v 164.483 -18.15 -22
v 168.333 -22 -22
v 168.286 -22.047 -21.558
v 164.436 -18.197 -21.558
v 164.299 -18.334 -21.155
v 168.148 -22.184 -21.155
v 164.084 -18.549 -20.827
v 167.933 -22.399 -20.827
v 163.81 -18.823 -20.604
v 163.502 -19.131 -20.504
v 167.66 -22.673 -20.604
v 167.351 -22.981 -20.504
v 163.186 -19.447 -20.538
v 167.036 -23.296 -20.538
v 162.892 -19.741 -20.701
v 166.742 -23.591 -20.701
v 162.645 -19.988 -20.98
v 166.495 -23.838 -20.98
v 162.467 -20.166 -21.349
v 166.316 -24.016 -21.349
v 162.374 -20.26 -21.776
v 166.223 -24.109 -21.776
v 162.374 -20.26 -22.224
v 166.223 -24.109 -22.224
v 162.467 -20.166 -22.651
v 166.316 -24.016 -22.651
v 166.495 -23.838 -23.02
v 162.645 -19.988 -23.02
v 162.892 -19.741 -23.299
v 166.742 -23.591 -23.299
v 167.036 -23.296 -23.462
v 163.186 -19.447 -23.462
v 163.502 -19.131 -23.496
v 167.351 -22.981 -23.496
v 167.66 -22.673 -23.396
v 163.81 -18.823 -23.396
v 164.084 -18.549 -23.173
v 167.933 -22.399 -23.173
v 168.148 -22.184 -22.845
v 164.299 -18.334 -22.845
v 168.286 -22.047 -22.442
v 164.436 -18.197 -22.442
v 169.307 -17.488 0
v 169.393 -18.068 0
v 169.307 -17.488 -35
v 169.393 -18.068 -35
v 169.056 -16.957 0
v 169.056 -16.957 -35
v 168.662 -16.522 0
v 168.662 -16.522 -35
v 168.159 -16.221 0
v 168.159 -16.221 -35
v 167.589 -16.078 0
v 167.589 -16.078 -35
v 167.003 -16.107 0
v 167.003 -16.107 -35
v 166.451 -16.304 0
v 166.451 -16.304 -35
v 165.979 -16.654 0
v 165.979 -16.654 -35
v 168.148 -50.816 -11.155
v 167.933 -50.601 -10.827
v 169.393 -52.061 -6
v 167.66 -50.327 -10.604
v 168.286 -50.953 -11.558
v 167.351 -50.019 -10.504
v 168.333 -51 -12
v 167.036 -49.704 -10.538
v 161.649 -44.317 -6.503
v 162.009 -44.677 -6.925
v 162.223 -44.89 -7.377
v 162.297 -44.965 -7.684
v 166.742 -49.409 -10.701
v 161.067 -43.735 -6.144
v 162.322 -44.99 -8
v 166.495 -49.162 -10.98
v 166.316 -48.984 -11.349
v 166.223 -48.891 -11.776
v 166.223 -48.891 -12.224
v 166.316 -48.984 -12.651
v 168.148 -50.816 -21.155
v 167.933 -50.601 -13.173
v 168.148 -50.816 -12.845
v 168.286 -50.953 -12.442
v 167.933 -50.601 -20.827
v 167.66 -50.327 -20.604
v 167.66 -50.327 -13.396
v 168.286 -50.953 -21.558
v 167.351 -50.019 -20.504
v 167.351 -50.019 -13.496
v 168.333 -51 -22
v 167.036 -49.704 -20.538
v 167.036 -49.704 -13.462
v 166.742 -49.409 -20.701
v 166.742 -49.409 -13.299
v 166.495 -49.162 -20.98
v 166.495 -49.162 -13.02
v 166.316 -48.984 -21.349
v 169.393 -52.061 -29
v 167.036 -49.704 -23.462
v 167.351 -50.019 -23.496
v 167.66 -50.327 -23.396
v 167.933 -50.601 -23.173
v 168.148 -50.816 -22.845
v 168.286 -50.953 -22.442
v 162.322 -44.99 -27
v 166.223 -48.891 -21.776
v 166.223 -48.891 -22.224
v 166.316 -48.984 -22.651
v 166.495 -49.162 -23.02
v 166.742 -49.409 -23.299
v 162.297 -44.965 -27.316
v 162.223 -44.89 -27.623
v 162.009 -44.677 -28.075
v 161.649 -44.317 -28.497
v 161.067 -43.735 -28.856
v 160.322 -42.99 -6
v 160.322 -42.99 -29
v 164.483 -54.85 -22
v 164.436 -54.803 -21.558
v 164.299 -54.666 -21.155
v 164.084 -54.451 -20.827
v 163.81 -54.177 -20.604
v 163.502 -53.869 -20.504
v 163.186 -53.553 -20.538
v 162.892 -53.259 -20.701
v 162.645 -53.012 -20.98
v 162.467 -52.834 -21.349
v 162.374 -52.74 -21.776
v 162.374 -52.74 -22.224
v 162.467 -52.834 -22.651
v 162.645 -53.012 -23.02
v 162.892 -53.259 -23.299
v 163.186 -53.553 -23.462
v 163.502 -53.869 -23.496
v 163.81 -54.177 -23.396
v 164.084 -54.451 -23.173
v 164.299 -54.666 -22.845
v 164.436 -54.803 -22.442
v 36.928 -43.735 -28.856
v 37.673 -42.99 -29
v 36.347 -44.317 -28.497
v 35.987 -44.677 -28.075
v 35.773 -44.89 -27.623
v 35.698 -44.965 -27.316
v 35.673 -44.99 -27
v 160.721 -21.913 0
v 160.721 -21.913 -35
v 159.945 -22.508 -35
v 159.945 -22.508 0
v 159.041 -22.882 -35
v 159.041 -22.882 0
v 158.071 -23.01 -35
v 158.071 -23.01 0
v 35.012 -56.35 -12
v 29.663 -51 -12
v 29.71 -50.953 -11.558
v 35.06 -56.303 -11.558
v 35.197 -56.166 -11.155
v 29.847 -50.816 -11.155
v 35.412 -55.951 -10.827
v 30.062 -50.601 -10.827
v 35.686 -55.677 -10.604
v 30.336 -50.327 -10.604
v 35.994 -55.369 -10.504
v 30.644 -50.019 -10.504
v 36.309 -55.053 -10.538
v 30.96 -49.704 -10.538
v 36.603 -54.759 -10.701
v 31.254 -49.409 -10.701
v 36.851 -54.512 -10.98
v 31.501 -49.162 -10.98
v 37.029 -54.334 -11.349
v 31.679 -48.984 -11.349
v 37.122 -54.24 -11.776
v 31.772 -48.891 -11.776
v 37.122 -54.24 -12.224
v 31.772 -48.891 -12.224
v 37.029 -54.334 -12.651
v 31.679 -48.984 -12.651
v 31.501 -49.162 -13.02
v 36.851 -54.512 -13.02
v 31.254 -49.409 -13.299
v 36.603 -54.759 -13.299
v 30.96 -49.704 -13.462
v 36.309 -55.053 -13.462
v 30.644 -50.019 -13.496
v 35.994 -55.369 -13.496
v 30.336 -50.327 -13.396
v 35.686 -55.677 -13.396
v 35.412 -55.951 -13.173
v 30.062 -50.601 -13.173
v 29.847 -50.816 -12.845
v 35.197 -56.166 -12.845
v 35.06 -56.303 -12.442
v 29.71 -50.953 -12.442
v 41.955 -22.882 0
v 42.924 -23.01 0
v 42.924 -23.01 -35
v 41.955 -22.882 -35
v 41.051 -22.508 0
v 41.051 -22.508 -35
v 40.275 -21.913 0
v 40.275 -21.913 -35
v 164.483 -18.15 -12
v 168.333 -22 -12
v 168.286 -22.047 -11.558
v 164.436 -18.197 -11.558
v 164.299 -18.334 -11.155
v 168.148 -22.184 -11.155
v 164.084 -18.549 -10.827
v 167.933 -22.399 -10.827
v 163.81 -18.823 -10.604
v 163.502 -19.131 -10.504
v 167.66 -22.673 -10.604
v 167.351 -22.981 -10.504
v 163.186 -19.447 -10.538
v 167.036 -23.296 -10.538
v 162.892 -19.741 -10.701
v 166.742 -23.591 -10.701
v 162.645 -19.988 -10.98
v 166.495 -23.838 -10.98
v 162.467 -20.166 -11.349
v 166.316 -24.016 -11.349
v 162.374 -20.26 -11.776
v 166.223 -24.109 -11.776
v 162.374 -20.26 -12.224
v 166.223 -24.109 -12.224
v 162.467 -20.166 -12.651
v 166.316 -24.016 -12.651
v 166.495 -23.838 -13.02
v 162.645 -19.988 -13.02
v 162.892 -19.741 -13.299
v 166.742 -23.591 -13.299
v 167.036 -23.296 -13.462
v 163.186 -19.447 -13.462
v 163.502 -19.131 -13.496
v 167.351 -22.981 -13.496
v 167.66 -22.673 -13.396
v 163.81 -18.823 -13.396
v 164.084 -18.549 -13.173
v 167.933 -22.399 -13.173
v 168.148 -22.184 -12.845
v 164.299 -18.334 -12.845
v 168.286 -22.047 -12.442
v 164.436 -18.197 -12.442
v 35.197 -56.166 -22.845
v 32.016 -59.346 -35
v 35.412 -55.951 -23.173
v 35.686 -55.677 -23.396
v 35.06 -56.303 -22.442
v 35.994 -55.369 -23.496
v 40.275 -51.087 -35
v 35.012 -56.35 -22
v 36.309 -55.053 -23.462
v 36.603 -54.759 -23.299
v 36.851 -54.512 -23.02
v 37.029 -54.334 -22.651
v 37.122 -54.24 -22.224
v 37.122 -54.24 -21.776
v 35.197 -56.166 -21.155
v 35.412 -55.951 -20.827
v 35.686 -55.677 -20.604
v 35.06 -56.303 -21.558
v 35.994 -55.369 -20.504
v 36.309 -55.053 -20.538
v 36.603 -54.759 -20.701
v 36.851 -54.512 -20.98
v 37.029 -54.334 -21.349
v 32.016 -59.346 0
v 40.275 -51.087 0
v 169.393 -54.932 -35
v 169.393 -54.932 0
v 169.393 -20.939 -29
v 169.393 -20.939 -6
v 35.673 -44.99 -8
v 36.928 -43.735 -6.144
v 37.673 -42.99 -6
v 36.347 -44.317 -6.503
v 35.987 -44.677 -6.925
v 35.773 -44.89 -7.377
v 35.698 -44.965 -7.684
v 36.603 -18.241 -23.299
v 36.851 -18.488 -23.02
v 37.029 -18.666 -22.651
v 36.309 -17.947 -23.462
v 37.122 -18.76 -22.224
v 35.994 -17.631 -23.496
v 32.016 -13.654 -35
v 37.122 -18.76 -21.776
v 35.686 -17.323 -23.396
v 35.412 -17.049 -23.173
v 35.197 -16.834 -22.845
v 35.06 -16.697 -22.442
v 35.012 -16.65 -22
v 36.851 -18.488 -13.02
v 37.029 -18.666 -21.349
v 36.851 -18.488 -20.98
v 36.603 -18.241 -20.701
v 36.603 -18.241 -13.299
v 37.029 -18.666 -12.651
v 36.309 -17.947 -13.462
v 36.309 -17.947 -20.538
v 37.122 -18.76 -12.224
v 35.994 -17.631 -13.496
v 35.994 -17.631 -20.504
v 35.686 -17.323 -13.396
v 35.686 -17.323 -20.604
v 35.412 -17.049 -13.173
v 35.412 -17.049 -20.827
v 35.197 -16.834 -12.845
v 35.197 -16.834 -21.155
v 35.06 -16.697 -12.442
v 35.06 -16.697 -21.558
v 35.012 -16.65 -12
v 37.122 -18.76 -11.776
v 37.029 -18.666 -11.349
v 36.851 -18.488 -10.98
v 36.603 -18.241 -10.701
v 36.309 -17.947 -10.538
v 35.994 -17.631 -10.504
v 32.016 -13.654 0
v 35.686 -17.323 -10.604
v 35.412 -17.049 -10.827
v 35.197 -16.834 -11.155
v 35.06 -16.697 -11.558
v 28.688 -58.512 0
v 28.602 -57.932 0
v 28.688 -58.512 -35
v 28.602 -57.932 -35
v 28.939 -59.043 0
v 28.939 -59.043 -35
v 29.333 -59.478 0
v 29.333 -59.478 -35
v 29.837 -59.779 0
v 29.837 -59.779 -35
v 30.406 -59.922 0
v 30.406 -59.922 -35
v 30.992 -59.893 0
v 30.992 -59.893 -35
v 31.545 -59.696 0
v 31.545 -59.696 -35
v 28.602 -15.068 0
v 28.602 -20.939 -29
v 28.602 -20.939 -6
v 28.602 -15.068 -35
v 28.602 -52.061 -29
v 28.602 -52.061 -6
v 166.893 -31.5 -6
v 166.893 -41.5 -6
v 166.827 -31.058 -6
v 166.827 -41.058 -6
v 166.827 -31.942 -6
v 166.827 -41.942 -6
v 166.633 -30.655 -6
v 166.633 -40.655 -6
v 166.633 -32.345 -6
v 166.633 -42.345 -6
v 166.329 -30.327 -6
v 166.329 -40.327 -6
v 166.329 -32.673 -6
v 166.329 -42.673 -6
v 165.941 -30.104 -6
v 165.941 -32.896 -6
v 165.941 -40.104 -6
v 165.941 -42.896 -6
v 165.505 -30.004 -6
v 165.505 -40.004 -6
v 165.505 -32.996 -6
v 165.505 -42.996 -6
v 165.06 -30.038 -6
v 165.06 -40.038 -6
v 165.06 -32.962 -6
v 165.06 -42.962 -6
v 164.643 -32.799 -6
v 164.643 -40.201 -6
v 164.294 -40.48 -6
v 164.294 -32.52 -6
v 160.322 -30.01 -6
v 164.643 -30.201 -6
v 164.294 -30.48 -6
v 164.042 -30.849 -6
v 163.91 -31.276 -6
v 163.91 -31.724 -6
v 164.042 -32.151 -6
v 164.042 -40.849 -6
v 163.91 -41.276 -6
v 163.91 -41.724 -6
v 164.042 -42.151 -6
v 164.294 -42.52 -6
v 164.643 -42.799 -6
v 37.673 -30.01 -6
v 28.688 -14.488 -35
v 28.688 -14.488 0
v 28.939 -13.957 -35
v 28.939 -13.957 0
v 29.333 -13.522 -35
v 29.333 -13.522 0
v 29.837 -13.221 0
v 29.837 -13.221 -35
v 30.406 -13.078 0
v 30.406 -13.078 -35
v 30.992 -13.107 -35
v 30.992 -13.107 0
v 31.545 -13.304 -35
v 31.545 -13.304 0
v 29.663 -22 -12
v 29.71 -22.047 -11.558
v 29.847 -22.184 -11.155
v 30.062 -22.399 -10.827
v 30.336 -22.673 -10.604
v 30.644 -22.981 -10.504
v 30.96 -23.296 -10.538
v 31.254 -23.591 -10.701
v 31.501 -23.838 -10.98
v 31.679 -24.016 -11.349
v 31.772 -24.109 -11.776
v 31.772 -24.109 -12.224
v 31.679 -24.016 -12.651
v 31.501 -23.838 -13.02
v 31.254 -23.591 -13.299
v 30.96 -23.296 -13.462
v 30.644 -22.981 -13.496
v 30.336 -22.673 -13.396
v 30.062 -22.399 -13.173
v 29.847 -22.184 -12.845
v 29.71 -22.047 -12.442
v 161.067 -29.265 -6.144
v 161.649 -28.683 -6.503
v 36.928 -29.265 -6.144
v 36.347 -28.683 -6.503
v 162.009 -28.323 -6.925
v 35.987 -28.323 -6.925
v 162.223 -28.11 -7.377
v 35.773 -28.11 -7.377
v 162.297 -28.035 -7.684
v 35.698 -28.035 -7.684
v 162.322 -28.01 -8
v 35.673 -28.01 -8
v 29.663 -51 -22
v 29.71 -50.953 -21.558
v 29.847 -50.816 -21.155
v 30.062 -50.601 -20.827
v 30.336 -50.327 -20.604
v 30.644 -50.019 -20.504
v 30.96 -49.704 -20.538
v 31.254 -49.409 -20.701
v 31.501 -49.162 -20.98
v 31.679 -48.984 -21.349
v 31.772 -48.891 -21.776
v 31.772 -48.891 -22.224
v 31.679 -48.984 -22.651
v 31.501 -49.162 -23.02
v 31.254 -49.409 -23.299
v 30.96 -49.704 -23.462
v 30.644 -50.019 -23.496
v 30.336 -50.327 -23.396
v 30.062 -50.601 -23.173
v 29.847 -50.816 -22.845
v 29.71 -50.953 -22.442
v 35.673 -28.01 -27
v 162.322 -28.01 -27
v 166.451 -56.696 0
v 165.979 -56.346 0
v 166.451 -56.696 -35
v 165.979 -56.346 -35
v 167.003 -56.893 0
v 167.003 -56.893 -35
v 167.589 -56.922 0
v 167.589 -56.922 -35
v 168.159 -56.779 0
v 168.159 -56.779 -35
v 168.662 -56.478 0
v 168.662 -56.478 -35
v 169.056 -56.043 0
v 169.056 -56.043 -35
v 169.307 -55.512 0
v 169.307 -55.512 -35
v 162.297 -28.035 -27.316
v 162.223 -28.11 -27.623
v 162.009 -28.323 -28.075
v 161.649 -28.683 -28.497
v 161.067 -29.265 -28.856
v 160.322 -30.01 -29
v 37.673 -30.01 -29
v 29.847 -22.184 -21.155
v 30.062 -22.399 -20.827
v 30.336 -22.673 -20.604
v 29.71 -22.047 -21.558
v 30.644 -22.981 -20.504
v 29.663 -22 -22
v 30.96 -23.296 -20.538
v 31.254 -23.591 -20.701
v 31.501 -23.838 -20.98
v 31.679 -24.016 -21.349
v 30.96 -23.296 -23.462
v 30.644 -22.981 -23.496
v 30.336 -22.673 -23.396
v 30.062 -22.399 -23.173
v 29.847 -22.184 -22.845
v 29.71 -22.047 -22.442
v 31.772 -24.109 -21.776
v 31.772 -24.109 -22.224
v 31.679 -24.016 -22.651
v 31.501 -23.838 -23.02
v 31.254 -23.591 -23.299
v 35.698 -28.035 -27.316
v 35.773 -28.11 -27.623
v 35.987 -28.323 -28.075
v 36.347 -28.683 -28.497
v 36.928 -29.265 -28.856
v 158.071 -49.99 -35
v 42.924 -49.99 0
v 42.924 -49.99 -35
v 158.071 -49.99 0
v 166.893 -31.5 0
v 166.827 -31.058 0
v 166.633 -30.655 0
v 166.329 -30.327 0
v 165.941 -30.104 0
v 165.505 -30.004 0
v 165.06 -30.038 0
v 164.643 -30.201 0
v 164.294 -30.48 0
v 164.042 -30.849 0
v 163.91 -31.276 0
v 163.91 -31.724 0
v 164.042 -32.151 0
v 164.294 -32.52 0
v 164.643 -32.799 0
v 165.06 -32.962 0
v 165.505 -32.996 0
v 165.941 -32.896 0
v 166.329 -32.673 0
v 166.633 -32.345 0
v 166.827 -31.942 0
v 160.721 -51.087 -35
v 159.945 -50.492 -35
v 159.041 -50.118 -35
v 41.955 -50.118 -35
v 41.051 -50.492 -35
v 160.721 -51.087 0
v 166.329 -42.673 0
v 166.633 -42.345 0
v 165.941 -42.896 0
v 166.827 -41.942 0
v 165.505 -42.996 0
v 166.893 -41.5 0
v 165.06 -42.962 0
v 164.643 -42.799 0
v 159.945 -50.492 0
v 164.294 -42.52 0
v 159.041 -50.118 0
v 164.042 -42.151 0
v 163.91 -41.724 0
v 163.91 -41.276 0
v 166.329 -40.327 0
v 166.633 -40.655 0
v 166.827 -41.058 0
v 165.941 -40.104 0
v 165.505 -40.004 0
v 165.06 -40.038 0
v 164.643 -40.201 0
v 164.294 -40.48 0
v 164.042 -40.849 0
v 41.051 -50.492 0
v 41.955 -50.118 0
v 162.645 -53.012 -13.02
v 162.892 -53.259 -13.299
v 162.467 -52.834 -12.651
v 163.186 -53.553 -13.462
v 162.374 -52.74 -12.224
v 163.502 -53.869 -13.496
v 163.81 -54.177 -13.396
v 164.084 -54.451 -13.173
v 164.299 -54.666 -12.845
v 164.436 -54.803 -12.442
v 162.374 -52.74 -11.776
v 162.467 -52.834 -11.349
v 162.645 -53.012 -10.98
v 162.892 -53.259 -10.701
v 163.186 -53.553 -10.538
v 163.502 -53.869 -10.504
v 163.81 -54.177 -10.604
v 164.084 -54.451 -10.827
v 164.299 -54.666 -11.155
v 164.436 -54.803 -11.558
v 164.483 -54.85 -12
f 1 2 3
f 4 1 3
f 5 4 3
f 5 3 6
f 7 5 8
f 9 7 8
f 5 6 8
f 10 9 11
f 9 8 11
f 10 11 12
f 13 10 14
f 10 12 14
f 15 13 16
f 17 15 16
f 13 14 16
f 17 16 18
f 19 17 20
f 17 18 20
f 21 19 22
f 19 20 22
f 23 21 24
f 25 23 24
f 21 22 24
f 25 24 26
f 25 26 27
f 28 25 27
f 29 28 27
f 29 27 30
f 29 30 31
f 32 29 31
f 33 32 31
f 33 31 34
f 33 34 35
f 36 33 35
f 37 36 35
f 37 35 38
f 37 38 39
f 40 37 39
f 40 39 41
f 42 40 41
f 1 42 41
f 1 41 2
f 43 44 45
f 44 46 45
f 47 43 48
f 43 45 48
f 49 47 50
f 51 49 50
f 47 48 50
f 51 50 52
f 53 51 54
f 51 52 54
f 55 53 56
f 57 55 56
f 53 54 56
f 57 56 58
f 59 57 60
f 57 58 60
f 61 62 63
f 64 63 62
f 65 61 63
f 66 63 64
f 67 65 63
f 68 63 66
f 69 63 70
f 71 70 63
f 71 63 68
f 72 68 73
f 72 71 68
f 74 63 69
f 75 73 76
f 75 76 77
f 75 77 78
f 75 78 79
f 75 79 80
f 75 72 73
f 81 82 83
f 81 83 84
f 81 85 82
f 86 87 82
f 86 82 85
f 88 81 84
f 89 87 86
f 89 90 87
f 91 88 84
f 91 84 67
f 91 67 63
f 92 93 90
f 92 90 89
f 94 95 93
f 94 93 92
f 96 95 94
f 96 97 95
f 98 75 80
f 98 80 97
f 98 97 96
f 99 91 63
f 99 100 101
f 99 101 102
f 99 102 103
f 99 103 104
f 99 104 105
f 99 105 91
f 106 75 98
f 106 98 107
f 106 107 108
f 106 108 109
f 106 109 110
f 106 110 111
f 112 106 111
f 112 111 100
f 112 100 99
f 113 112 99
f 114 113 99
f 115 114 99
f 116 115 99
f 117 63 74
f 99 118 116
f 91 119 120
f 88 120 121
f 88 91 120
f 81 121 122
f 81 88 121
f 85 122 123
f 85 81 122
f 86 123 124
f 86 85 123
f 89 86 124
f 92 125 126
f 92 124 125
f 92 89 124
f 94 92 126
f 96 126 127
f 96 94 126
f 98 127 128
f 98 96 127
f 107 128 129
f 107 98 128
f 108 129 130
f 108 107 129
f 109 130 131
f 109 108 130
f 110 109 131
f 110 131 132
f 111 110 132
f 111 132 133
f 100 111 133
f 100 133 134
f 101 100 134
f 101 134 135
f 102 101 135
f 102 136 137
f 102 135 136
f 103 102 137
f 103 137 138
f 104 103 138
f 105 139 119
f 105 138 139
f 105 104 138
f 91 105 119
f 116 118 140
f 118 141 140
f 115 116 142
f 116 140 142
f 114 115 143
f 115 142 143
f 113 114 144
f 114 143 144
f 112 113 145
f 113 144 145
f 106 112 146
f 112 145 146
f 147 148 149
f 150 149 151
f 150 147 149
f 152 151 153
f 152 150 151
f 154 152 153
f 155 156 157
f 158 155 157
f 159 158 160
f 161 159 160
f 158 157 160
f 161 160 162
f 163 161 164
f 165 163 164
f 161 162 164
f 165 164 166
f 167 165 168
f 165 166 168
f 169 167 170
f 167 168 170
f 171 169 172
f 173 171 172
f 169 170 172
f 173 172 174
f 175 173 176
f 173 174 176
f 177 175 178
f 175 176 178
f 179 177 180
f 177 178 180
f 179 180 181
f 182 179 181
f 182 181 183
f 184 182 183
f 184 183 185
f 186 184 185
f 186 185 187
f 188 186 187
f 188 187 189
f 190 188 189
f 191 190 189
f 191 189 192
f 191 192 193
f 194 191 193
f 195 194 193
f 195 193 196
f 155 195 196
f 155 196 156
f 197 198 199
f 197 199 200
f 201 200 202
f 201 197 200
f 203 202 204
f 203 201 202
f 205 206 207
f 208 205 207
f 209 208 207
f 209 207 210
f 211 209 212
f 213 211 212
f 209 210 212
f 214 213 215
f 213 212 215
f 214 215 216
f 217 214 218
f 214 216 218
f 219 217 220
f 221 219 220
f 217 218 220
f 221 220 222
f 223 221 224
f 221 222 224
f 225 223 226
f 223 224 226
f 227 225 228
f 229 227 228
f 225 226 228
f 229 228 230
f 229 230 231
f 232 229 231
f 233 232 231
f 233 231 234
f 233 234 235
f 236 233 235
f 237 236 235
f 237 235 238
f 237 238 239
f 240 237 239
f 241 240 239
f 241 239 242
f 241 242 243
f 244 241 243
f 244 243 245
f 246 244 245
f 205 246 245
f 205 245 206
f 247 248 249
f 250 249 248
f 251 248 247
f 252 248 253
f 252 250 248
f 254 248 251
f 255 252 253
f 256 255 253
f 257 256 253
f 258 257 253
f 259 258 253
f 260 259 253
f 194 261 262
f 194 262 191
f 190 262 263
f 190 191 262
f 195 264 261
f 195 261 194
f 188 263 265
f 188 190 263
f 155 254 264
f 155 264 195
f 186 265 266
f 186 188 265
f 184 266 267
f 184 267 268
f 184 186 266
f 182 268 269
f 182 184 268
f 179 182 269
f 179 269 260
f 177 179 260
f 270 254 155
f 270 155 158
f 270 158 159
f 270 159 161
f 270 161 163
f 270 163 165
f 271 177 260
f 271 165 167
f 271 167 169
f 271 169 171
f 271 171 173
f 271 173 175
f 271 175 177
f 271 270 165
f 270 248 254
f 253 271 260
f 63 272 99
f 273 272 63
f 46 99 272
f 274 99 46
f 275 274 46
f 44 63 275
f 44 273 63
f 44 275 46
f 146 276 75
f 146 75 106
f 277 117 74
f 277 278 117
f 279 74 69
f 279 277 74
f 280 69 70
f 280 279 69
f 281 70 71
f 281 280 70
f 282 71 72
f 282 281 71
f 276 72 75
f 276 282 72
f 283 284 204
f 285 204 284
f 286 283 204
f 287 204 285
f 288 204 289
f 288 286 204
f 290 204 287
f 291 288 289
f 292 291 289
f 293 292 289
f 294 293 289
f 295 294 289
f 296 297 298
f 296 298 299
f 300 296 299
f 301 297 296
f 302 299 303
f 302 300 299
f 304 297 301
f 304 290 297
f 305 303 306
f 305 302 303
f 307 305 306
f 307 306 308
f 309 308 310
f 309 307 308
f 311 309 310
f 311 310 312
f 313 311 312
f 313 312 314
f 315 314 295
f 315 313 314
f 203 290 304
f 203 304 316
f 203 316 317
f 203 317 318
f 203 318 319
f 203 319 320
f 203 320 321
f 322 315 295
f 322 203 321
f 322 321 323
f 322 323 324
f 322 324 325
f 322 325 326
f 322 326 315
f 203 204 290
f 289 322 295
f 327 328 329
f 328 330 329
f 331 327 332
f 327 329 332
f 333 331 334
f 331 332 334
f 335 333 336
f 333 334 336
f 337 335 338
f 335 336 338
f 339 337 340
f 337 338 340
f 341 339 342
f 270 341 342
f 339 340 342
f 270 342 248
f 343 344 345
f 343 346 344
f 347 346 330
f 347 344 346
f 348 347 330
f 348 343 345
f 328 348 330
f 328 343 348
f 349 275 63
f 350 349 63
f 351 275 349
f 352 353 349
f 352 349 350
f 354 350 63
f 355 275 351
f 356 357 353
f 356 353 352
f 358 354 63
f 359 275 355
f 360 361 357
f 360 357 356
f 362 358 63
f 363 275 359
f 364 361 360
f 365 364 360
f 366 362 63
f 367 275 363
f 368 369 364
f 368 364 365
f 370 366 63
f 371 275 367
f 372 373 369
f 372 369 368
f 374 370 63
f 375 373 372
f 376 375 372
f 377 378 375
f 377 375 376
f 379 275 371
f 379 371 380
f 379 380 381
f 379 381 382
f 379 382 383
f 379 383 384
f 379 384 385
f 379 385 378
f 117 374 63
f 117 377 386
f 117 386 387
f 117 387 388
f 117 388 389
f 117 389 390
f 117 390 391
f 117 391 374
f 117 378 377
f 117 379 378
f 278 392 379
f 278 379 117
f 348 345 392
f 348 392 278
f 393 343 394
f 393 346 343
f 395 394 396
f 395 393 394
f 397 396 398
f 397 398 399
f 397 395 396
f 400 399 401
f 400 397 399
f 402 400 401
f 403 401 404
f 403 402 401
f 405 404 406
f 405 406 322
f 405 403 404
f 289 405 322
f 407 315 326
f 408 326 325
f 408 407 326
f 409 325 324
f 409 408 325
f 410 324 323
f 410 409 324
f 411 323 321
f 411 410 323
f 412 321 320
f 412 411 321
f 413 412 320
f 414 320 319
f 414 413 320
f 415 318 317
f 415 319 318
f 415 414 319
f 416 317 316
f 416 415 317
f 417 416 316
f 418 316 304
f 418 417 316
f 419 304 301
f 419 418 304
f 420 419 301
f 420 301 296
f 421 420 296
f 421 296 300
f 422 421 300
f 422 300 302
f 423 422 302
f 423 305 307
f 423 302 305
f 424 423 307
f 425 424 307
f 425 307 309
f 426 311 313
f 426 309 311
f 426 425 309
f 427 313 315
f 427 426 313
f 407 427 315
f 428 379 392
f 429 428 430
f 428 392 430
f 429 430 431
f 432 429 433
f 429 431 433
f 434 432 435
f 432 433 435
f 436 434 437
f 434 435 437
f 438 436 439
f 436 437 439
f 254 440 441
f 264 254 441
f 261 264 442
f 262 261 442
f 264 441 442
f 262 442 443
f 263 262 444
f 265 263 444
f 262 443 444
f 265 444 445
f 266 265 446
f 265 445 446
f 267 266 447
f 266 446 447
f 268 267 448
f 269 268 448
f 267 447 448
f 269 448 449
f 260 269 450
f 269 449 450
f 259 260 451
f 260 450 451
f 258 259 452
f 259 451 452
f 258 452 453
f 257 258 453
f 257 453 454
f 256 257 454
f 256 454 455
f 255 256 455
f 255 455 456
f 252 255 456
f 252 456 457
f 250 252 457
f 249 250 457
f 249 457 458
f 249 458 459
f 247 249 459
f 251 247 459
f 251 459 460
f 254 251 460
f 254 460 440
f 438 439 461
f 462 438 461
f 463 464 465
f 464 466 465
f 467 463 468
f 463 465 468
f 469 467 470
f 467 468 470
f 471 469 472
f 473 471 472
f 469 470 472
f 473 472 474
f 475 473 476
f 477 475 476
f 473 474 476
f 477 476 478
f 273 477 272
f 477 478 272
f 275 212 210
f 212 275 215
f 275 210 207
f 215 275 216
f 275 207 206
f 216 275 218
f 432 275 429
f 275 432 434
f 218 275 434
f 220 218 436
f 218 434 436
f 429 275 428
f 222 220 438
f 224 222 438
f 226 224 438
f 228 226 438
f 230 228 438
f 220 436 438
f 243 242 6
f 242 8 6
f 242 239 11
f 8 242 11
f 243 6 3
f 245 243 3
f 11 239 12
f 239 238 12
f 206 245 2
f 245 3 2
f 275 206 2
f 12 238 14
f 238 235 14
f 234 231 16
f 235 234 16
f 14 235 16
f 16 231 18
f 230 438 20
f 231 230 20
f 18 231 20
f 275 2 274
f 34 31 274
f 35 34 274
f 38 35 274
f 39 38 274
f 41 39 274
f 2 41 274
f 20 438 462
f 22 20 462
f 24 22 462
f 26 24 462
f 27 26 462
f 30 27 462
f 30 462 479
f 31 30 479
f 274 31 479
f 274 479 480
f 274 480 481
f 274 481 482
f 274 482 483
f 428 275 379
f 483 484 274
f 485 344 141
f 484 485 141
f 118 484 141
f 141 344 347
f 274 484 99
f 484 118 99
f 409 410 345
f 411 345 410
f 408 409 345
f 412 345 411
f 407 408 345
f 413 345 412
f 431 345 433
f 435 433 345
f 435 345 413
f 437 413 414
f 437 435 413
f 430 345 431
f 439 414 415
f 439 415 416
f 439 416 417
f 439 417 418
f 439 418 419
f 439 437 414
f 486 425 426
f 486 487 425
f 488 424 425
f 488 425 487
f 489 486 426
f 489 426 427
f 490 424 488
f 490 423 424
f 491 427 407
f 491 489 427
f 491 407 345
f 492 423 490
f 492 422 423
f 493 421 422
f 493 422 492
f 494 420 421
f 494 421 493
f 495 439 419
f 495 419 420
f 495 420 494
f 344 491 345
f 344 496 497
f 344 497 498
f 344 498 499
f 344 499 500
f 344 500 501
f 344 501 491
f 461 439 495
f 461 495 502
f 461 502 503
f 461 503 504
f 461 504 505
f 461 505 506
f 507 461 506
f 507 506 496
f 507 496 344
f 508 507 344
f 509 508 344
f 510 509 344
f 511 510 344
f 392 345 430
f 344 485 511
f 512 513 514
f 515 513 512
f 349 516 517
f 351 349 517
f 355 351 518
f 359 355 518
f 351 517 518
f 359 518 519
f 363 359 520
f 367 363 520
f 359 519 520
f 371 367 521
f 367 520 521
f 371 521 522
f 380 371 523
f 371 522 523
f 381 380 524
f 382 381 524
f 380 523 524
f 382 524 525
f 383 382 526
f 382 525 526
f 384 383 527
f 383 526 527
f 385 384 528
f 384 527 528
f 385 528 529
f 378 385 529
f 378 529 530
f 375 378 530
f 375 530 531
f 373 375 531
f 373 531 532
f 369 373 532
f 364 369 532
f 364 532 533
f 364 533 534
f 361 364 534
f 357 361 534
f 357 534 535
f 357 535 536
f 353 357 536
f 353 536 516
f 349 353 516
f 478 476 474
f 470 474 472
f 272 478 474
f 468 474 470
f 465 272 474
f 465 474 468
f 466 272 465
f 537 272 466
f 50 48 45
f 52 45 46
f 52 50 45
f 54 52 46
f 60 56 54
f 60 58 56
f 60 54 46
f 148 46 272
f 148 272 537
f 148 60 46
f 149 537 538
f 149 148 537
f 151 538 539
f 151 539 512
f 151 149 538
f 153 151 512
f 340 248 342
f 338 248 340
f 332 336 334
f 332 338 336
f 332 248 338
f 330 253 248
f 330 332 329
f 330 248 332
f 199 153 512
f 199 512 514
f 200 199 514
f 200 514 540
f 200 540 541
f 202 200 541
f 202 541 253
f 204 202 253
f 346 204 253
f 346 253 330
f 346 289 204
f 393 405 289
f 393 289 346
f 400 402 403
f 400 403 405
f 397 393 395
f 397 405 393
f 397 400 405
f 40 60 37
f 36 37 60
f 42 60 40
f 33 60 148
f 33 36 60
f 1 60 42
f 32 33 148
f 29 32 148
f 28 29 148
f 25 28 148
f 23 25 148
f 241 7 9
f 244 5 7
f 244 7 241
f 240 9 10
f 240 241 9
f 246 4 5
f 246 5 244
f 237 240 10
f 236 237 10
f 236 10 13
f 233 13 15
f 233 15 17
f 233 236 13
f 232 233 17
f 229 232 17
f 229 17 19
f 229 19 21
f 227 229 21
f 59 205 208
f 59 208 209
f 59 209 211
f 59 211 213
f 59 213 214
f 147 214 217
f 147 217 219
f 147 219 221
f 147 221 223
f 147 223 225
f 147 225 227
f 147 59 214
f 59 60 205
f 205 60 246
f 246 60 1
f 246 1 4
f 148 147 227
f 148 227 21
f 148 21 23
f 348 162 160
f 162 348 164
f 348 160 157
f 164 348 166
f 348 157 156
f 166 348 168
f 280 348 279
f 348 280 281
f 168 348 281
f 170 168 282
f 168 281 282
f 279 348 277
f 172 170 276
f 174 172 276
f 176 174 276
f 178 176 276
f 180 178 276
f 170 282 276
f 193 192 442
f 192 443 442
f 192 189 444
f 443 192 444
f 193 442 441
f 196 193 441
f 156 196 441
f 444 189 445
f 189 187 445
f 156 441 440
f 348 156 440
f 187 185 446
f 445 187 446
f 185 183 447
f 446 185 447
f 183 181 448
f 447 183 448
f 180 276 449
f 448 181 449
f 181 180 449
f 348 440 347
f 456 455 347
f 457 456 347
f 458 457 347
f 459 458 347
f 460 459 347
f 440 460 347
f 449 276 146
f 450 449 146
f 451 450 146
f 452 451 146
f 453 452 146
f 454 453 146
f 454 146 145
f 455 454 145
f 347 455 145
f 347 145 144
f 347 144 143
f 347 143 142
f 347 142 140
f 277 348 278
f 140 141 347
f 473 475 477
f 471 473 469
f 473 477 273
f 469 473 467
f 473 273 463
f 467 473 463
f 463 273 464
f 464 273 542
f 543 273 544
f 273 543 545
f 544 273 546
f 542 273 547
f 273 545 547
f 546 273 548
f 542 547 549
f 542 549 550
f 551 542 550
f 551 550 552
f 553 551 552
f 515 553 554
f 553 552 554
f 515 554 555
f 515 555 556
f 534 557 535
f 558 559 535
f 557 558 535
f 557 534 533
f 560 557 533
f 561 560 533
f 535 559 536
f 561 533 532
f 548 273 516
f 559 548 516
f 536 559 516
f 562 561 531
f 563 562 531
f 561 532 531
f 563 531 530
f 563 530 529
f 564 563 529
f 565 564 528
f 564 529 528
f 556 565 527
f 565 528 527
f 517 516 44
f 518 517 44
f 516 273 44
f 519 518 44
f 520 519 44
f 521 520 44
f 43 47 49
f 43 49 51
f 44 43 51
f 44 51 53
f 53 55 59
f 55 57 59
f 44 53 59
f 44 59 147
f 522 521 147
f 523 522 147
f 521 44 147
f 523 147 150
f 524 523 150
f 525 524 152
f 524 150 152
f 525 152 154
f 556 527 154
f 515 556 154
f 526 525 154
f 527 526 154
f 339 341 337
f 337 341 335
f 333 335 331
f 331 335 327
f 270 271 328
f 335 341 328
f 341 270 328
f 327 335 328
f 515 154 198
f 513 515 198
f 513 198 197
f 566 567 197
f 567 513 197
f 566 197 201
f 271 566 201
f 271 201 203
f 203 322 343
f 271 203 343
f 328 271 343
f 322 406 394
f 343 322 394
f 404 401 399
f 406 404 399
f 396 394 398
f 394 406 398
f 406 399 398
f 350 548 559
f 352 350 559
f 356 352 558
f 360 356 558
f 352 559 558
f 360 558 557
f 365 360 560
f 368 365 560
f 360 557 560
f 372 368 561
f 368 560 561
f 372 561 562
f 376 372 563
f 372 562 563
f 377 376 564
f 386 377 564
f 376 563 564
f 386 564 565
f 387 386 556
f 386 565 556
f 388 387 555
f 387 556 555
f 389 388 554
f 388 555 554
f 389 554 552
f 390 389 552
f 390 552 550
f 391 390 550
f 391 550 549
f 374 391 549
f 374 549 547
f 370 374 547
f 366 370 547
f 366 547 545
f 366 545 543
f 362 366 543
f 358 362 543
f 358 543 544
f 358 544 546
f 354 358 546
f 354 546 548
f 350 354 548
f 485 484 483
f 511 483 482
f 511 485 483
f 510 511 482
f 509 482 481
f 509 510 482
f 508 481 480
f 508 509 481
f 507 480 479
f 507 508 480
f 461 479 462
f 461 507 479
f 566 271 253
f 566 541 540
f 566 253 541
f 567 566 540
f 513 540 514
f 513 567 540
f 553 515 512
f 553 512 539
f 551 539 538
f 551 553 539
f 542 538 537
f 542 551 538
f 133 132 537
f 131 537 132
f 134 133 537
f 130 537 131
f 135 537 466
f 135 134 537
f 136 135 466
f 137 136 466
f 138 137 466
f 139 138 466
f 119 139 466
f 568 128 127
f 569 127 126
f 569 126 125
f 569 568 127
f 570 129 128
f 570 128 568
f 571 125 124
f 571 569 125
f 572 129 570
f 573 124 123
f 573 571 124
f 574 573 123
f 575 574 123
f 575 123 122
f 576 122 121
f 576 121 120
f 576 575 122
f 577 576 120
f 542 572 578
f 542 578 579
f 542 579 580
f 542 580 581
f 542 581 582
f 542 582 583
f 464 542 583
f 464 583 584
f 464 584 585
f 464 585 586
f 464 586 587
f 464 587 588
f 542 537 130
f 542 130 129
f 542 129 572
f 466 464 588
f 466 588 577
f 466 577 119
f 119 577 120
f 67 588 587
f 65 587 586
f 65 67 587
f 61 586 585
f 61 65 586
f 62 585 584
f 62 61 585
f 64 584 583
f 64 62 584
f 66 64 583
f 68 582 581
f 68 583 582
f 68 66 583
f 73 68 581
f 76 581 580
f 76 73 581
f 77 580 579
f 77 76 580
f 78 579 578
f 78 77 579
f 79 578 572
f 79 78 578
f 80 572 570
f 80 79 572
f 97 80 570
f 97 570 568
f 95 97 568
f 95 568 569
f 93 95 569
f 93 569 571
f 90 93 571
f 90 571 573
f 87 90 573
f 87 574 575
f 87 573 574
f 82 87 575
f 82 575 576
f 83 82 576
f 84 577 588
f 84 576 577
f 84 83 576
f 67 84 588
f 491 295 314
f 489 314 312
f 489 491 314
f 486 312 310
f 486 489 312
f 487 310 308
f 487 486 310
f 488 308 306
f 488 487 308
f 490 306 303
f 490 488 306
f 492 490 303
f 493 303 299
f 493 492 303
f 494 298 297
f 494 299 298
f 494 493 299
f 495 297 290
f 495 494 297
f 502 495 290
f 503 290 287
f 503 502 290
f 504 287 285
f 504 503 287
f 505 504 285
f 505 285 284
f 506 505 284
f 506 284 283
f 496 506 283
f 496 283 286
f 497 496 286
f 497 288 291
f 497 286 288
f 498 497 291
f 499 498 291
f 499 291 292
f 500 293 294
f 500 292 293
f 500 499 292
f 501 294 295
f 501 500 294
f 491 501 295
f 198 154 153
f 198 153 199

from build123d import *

# Parameters (mm, degrees)
EXTRUDE_1_DEPTH          = 35
CUT_EXTRUDE_1_DEPTH      = 185.022712326
SKETCH_3_W               = 23
SKETCH_3_H               = 16.98
CUT_EXTRUDE_2_DEPTH      = 159.069540958
SKETCH_5_W               = 23
SKETCH_5_H               = 7.5
CUT_EXTRUDE_3_DEPTH      = 5
SKETCH_6_R               = 1.5
CUT_EXTRUDE_4_DEPTH      = 138.067283793
MIRROR_2_COPY_1_SKETCH_W = 23
MIRROR_2_COPY_1_SKETCH_H = 7.5
MIRROR_2_COPY_1_DEPTH    = 5
MIRROR_2_COPY_2_SKETCH_R = 1.5
MIRROR_2_COPY_2_DEPTH    = 138.067283793
FILLET_3_R               = 2
SKETCH_7_R               = 1.5
CUT_EXTRUDE_5_DEPTH      = 8


with BuildPart() as part:
    # 草图1 → 凸台-拉伸1 (new body)
    with BuildSketch(Plane.XY):
        with BuildLine():
            ThreePointArc((40.282032616, -21.905575199), (41.494272902, -22.715568261), (42.924207815, -23))
            Line((42.924207815, -23), (158.071347708, -23))
            ThreePointArc((158.071347708, -23), (159.501282621, -22.715568261), (160.713522906, -21.905575199))
            Line((160.713522906, -21.905575199), (169.40335296, -13.215745145))
            Line((169.40335296, -13.215745145), (169.40335296, -59.784254855))
            Line((169.40335296, -59.784254855), (160.713522906, -51.094424801))
            ThreePointArc((160.713522906, -51.094424801), (159.501282621, -50.284431739), (158.071347708, -50))
            Line((158.071347708, -50), (42.924207815, -50))
            ThreePointArc((42.924207815, -50), (41.494272902, -50.284431739), (40.282032616, -51.094424801))
            Line((40.282032616, -51.094424801), (28.592202563, -62.784254855))
            Line((28.592202563, -62.784254855), (28.592202563, -10.215745145))
            Line((28.592202563, -10.215745145), (40.282032616, -21.905575199))
        make_face()
    extrude(amount=-EXTRUDE_1_DEPTH)

    # 草图2 → 切除-拉伸1 (cut, through all)
    with BuildSketch(Plane.XY):
        with BuildLine():
            Line((40.282032616, -21.905575199), (28.592202563, -10.215745145))
            Line((28.592202563, -10.215745145), (28.592202563, -62.784254855))
            Line((28.592202563, -62.784254855), (40.282032616, -51.094424801))
            ThreePointArc((40.282032616, -51.094424801), (41.494272902, -50.284431739), (42.924207815, -50))
            Line((42.924207815, -50), (158.071347708, -50))
            ThreePointArc((158.071347708, -50), (159.501282621, -50.284431739), (160.713522906, -51.094424801))
            Line((160.713522906, -51.094424801), (169.40335296, -59.784254855))
            Line((169.40335296, -59.784254855), (169.40335296, -13.215745145))
            Line((169.40335296, -13.215745145), (160.713522906, -21.905575199))
            ThreePointArc((160.713522906, -21.905575199), (159.501282621, -22.715568261), (158.071347708, -23))
            Line((158.071347708, -23), (42.924207815, -23))
            ThreePointArc((42.924207815, -23), (41.494272902, -22.715568261), (40.282032616, -21.905575199))
        make_face()
        with BuildLine():
            Line((28.602202563, -10.239887281), (28.602202563, -62.760112719))
            Line((28.602202563, -62.760112719), (40.274961549, -51.087353734))
            ThreePointArc((40.274961549, -51.087353734), (41.490446067, -50.275192944), (42.924207815, -49.99))
            Line((42.924207815, -49.99), (158.071347708, -49.99))
            ThreePointArc((158.071347708, -49.99), (159.505109455, -50.275192944), (160.720593974, -51.087353734))
            Line((160.720593974, -51.087353734), (169.39335296, -59.760112719))
            Line((169.39335296, -59.760112719), (169.39335296, -13.239887281))
            Line((169.39335296, -13.239887281), (160.720593974, -21.912646266))
            ThreePointArc((160.720593974, -21.912646266), (159.505109455, -22.724807057), (158.071347708, -23.01))
            Line((158.071347708, -23.01), (42.924207815, -23.01))
            ThreePointArc((42.924207815, -23.01), (41.490446067, -22.724807057), (40.274961549, -21.912646266))
            Line((40.274961549, -21.912646266), (28.602202563, -10.239887281))
        make_face(mode=Mode.SUBTRACT)
    extrude(amount=-CUT_EXTRUDE_1_DEPTH, mode=Mode.SUBTRACT)

    # 草图3 → 切除-拉伸2 (cut, through all)
    with BuildSketch(Plane(origin=(169.39335296, 0, 0), x_dir=(0, 0, -1), z_dir=(1, 0, 0))):
        with Locations((17.5, -36.5)):
            Rectangle(SKETCH_3_W, SKETCH_3_H)
    extrude(amount=-CUT_EXTRUDE_2_DEPTH, mode=Mode.SUBTRACT)

    # 草图5 → 切除-拉伸3 (cut)
    with BuildSketch(Plane(origin=(36.796101281, -36.796101281, 0), x_dir=(0, 0, -1), z_dir=(0.7071067811865873, -0.7071067811865078, 0))):
        with Locations((17.5, -15.337922697)):
            Rectangle(SKETCH_5_W, SKETCH_5_H)
        with Locations((17.5, -7.837922697)):
            Rectangle(SKETCH_5_W, SKETCH_5_H)
    cut_extrude_3 = extrude(amount=CUT_EXTRUDE_3_DEPTH, mode=Mode.SUBTRACT)

    # 草图6 → 切除-拉伸4 (cut, through all)
    with BuildSketch(Plane(origin=(40.331635187, -40.331635187, 0), x_dir=(0, 0, 1), z_dir=(-0.7071067811865871, 0.707106781186508, 0))):
        with Locations(Location((-12, -13.587922697, 0), (0, 0, 270))):
            Circle(SKETCH_6_R)
        with Locations(Location((-22, -13.587922697, 0), (0, 0, 270))):
            Circle(SKETCH_6_R)
    cut_extrude_4 = extrude(amount=-CUT_EXTRUDE_4_DEPTH, mode=Mode.SUBTRACT)

    # 镜向1: 切除-拉伸3, 切除-拉伸4 across plane
    add(cut_extrude_3.mirror(Plane.ZX.offset(-36.5)), mode=Mode.SUBTRACT)
    add(cut_extrude_4.mirror(Plane.ZX.offset(-36.5)), mode=Mode.SUBTRACT)

    # 镜向2: 切除-拉伸3, 切除-拉伸4 across plane
    add(cut_extrude_3.mirror(Plane(origin=(98.997777761, 0, 0), x_dir=(0, 0, 1), z_dir=(1, 0, 0))), mode=Mode.SUBTRACT)
    add(cut_extrude_4.mirror(Plane(origin=(98.997777761, 0, 0), x_dir=(0, 0, 1), z_dir=(1, 0, 0))), mode=Mode.SUBTRACT)

    # 镜向2 copy 1 sketch → 镜向2 copy 1 (cut)
    with BuildSketch(Plane(origin=(161.199454241, -36.203898719, 0), x_dir=(0, 0, -1), z_dir=(-0.7071067811865942, 0.7071067811865009, 0))):
        with Locations((17.5, -15.337922697)):
            Rectangle(MIRROR_2_COPY_1_SKETCH_W, MIRROR_2_COPY_1_SKETCH_H)
        with Locations((17.5, -7.837922697)):
            Rectangle(MIRROR_2_COPY_1_SKETCH_W, MIRROR_2_COPY_1_SKETCH_H)
    extrude(amount=MIRROR_2_COPY_1_DEPTH, mode=Mode.SUBTRACT)

    # 镜向2 copy 2 sketch → 镜向2 copy 2 (cut, through all)
    with BuildSketch(Plane(origin=(157.663920335, -32.668364813, 0), x_dir=(0, 0, 1), z_dir=(0.707106781186594, -0.7071067811865012, 0))):
        with Locations(Location((-12, -13.587922697, 0), (0, 0, 270))):
            Circle(MIRROR_2_COPY_2_SKETCH_R)
        with Locations(Location((-22, -13.587922697, 0), (0, 0, 270))):
            Circle(MIRROR_2_COPY_2_SKETCH_R)
    extrude(amount=-MIRROR_2_COPY_2_DEPTH, mode=Mode.SUBTRACT)

    # 圆角3
    fillet_3_edges = [part.edges().sort_by_distance(p)[0] for p in [
        (98.997777761, -44.99, -6),
        (98.997777761, -44.99, -29),
        (98.997777761, -28.01, -6),
        (98.997777761, -28.01, -29),
        (169.39335296, -13.239887281, -17.5),
        (169.39335296, -59.760112719, -17.5),
        (28.602202563, -62.760112719, -17.5),
        (28.602202563, -10.239887281, -17.5),
    ]]
    fillet(fillet_3_edges, radius=FILLET_3_R)

    # 草图7 → 切除-拉伸5 (cut)
    with BuildSketch(Plane.XY):
        with Locations((165.39335296, -41.5)):
            Circle(SKETCH_7_R)
        with Locations((165.39335296, -31.5)):
            Circle(SKETCH_7_R)
    extrude(amount=-CUT_EXTRUDE_5_DEPTH, mode=Mode.SUBTRACT)


solid = part.part
